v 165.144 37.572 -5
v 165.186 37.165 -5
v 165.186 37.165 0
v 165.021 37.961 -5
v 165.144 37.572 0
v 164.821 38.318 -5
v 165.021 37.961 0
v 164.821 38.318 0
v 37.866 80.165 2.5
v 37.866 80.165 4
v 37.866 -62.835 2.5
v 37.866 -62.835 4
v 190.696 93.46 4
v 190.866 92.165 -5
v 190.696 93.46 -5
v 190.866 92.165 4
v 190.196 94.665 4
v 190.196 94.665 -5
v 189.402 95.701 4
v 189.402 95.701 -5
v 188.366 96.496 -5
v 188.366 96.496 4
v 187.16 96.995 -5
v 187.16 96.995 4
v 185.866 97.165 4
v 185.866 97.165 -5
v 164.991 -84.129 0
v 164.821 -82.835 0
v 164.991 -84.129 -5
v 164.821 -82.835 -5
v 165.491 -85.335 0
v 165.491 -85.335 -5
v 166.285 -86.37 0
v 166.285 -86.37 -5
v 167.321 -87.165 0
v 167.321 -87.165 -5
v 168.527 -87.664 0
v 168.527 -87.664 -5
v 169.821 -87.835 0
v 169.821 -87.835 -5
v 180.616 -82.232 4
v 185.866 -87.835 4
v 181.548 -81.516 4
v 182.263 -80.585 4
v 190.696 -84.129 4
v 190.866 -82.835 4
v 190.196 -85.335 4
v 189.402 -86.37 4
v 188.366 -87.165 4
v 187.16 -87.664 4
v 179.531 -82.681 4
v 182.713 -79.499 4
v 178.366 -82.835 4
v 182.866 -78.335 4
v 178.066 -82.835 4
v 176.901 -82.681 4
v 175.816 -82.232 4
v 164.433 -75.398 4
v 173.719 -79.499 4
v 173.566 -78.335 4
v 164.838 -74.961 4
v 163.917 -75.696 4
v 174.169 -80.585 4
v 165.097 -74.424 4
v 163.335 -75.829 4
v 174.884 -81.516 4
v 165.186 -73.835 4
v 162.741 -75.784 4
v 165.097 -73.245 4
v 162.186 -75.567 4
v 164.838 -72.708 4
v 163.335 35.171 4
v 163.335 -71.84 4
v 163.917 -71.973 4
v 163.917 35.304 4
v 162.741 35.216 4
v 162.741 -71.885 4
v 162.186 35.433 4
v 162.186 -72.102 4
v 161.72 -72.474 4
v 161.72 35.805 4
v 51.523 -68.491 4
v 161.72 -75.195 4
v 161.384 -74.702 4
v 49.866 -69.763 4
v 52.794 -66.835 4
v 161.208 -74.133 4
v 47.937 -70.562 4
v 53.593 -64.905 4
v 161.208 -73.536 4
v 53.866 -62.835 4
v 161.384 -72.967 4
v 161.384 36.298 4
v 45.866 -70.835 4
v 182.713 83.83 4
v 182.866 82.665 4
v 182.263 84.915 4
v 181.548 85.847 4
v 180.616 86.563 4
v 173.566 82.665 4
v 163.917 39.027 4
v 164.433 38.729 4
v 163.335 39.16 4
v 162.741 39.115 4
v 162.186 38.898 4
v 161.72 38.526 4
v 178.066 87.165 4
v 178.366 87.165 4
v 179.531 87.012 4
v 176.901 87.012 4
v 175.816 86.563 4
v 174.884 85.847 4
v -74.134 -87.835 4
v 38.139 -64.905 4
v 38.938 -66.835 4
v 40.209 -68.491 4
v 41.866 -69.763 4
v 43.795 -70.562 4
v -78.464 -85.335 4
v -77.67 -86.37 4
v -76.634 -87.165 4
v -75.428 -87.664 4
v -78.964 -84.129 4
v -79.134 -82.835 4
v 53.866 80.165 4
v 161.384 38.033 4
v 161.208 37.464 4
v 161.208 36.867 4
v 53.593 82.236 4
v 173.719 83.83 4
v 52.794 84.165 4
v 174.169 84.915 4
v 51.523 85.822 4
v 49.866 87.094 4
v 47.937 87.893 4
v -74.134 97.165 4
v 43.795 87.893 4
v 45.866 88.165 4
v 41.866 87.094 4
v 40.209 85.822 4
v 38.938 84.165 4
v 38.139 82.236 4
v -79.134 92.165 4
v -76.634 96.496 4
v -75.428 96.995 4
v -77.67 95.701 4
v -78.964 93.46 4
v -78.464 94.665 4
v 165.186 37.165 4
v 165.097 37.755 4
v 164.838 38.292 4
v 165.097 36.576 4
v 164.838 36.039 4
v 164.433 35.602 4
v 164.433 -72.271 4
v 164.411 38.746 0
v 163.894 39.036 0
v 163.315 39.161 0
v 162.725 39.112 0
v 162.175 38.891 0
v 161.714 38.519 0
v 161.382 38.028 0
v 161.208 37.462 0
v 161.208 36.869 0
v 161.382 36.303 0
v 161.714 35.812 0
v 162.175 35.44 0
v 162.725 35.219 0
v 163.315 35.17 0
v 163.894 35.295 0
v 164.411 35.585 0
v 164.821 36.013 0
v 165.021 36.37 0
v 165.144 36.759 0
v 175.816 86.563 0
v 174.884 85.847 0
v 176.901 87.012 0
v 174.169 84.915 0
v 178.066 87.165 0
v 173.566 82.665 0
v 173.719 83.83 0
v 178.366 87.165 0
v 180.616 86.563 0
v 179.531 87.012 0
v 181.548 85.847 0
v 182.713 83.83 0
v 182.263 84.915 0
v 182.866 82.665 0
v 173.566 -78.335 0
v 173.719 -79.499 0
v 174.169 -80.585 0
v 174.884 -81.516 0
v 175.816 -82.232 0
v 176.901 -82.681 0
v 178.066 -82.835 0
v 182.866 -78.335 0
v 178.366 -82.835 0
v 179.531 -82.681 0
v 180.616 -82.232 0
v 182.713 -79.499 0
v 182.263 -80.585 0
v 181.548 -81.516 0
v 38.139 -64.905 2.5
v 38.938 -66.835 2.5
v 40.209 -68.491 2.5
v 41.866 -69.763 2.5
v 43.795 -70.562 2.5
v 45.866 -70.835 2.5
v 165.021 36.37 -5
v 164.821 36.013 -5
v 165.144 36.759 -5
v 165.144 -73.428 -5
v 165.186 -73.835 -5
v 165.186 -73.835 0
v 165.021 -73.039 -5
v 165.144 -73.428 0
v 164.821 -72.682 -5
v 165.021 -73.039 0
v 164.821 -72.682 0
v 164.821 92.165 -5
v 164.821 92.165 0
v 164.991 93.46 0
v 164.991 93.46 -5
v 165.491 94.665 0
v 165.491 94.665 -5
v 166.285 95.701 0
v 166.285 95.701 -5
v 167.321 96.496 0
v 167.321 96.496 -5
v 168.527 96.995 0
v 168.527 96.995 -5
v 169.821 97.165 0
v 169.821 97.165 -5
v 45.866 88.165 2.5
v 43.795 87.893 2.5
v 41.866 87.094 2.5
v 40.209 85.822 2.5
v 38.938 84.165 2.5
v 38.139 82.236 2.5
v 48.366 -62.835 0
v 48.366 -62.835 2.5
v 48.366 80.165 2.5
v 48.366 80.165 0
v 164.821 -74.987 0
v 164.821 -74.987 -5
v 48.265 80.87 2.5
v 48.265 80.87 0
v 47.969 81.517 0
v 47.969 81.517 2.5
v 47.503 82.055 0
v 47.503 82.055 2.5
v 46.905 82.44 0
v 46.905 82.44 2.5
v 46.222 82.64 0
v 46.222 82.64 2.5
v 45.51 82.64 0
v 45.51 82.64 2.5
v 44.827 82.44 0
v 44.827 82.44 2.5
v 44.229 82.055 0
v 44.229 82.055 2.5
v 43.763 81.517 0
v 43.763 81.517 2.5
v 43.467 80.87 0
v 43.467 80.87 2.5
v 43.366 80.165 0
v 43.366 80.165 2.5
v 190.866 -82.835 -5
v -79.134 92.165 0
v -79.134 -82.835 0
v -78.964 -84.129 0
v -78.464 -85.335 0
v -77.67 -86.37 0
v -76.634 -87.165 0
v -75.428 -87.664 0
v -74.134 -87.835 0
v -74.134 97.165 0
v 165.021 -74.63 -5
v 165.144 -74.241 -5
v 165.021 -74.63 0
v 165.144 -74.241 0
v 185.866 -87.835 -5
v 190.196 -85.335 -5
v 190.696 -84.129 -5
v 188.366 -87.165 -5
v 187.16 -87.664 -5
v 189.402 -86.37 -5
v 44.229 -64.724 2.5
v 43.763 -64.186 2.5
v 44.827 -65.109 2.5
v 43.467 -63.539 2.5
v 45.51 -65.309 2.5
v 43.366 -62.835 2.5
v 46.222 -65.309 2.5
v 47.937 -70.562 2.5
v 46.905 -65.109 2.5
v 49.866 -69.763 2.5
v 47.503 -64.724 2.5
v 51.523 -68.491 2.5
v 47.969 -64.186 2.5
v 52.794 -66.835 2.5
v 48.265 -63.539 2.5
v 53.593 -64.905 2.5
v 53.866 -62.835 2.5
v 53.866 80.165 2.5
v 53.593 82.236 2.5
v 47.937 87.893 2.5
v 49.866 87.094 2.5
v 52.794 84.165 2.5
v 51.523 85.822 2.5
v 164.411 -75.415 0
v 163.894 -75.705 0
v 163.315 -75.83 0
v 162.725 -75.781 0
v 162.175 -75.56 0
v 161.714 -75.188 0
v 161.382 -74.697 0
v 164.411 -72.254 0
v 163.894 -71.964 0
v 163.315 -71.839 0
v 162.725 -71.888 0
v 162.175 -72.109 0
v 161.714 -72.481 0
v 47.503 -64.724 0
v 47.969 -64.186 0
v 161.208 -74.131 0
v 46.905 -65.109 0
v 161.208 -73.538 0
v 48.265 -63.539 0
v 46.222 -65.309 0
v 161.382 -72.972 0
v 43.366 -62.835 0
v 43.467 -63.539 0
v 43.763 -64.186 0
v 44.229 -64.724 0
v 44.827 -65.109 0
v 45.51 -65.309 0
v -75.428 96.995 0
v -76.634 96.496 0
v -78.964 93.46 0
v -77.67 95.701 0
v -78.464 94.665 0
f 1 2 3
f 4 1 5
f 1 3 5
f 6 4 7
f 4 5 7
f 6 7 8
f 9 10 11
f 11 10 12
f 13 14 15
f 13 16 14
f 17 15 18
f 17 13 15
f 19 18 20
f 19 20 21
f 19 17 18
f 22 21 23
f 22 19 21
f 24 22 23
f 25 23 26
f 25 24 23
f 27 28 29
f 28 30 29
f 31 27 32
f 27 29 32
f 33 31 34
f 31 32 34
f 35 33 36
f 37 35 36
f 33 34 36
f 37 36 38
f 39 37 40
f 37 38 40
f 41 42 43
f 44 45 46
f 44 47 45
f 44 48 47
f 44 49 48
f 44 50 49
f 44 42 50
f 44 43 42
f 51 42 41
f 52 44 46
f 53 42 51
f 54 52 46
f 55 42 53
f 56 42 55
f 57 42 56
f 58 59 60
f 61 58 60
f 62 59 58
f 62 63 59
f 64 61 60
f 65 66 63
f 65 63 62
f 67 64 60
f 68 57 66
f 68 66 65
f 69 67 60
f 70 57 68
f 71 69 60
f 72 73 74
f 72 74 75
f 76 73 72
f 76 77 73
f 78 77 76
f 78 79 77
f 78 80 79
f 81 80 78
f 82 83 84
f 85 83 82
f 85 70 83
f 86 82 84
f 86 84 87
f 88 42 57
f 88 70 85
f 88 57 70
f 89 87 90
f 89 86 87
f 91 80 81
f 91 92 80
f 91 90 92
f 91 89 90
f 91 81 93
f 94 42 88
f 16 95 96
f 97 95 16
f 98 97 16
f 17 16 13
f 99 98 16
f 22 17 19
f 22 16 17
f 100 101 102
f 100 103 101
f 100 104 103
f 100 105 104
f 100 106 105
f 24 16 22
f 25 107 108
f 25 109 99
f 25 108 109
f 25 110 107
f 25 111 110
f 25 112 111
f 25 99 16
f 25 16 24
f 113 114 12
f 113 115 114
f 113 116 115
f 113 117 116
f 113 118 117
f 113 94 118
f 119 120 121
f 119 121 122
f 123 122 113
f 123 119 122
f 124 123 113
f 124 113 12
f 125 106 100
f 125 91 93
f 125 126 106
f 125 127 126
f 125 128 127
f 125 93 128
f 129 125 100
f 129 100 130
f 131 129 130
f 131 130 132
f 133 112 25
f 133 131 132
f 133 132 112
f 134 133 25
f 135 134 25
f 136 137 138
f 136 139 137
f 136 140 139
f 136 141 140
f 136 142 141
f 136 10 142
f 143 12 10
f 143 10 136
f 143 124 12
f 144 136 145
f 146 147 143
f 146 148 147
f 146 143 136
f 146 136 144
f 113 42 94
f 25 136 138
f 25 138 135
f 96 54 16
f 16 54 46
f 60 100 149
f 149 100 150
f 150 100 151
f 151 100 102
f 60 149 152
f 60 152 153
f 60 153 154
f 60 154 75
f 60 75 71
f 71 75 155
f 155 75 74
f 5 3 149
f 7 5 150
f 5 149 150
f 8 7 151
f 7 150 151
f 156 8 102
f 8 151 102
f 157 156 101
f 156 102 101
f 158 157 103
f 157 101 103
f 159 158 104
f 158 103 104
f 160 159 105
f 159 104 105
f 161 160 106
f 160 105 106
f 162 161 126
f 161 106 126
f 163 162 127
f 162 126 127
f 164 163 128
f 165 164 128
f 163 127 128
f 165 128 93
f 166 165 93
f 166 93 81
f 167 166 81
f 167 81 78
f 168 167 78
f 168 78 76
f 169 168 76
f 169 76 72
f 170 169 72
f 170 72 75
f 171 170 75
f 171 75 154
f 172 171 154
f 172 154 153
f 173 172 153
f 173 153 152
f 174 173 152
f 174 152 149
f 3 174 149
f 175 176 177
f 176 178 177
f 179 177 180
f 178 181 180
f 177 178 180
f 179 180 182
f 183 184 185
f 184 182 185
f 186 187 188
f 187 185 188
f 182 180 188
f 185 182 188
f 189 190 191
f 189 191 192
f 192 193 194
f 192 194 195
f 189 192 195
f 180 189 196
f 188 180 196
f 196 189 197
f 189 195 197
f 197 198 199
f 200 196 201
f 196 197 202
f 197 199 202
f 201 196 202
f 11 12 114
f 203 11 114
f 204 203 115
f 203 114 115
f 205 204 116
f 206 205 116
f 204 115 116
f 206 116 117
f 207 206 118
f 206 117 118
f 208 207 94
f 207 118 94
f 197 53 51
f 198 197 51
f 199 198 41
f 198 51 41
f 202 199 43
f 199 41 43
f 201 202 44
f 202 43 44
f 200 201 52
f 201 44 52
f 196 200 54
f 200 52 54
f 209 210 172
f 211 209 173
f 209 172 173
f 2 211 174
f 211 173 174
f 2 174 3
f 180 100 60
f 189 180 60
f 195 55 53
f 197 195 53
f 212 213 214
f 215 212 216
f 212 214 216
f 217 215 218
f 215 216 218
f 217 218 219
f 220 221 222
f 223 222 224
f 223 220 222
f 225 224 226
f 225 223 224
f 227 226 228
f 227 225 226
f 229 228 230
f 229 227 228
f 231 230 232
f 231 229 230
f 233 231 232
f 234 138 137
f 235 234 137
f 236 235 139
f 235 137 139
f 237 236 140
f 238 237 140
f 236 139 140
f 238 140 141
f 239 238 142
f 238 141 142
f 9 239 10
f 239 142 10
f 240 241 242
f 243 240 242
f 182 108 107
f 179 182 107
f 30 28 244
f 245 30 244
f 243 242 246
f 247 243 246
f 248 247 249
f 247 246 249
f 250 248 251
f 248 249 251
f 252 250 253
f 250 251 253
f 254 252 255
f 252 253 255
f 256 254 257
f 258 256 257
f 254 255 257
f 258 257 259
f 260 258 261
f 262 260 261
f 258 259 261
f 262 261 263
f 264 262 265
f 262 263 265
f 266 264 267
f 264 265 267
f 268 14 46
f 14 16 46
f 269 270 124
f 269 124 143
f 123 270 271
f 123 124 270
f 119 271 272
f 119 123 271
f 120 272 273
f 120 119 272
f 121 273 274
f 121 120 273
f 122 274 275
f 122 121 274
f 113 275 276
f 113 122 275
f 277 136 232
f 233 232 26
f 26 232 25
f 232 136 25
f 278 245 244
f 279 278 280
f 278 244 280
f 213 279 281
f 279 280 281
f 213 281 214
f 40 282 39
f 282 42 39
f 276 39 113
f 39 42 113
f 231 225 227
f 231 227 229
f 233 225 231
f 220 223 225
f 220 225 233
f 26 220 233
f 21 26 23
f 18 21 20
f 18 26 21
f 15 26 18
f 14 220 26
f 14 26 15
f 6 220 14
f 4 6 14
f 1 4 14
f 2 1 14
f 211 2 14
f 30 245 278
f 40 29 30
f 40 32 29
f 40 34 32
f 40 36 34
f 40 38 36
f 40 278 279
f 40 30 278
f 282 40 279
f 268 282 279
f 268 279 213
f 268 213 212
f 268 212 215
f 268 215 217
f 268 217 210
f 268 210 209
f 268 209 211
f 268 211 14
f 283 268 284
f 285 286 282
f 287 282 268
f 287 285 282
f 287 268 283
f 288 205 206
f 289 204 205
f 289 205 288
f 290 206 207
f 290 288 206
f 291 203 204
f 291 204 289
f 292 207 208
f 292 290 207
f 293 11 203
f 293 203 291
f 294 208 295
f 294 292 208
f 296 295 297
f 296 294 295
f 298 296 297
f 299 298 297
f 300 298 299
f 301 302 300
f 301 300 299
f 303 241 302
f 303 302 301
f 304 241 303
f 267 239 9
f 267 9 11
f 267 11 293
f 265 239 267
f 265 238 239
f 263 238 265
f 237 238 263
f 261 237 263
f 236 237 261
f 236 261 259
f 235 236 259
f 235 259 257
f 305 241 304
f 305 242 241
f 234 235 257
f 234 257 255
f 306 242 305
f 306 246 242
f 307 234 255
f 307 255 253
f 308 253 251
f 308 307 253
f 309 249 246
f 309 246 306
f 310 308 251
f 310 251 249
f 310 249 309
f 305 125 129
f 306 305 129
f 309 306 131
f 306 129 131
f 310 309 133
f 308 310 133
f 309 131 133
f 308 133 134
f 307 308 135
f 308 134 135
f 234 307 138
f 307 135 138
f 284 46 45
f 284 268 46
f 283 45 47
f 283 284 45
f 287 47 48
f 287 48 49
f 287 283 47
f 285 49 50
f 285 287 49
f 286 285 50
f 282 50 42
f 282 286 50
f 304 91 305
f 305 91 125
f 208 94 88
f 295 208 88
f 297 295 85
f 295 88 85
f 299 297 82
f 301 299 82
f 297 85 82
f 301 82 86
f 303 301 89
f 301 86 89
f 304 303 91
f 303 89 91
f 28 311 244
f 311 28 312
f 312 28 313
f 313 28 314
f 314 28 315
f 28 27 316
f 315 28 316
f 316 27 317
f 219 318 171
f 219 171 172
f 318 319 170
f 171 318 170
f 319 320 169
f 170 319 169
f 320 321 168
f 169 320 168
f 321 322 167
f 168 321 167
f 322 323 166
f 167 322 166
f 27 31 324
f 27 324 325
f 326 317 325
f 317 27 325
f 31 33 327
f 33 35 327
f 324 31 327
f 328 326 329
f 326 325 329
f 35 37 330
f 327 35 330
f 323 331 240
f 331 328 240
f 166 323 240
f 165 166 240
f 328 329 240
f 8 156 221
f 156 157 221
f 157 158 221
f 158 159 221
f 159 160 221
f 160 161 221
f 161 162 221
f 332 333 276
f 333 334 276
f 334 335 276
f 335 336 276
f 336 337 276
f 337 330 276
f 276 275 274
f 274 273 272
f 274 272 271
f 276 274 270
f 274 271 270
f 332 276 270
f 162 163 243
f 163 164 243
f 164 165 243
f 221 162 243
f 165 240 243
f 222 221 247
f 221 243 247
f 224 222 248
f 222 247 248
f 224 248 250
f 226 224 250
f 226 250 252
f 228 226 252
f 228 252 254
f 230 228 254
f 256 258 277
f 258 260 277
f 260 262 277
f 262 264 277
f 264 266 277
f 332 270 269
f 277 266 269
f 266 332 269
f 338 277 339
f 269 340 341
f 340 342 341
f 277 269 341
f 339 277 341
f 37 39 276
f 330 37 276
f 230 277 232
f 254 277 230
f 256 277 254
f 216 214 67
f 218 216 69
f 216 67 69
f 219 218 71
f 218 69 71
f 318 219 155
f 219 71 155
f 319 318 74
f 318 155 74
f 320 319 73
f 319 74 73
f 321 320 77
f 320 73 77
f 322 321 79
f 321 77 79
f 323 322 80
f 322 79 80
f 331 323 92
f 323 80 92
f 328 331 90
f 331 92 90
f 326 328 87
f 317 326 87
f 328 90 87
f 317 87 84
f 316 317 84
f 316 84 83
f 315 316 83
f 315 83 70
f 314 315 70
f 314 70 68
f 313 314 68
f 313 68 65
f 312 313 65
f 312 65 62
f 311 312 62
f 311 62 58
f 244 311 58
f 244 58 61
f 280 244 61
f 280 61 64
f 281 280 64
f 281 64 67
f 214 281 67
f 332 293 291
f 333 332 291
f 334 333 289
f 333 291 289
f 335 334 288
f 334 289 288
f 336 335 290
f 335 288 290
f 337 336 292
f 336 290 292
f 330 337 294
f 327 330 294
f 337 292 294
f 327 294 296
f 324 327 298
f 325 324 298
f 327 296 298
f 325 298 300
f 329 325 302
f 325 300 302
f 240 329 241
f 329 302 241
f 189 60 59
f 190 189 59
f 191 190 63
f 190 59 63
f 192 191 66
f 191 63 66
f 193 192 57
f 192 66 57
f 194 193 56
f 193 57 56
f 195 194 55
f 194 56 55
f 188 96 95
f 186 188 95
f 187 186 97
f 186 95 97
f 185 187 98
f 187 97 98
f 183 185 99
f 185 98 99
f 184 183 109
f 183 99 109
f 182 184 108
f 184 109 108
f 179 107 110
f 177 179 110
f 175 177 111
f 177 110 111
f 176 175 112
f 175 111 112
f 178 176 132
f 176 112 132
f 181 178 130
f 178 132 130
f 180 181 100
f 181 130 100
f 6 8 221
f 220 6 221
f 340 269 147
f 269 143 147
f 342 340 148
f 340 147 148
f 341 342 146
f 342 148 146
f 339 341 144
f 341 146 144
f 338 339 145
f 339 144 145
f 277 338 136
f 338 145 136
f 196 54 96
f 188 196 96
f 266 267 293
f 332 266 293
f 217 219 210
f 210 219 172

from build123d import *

# Parameters (mm, degrees)
F0_W      = 250
F0_H      = 185
F1_DEPTH  = 4
F3_DEPTH  = 1.5
F5_DEPTH  = 5
F6_R      = 2
F7_DEPTH  = 25
F8_DEPTH  = 20
F10_DEPTH = 4.001
F12_DEPTH = 5
F13_R     = 5


with BuildPart() as f1:
    # F0 (on Top) → F1 (new body)
    with BuildSketch(Plane.XY):
        with Locations((45.8660066128, 4.6654982038)):
            Rectangle(F0_W, F0_H)
    extrude(amount=F1_DEPTH)

    # F2 (on face) → F3 (cut)
    with BuildSketch(Plane.XY.offset(4)):
        with BuildLine():
            ThreePointArc((53.8660066128, 80.1654982038), (51.5228608623, 85.8223524533), (45.8660066128, 88.1654982038))
            ThreePointArc((45.8660066128, 88.1654982038), (40.2091523633, 85.8223524533), (37.8660066128, 80.1654982038))
            Line((37.8660066128, 80.1654982038), (37.8660066128, -62.8345017962))
            ThreePointArc((37.8660066128, -62.8345017962), (40.2091523633, -68.4913560457), (45.8660066128, -70.8345017962))
            ThreePointArc((45.8660066128, -70.8345017962), (51.5228608623, -68.4913560457), (53.8660066128, -62.8345017962))
            Line((53.8660066128, -62.8345017962), (53.8660066128, 80.1654982038))
        make_face()
    extrude(amount=-F3_DEPTH, mode=Mode.SUBTRACT)

    # F4 (on face) → F5 (cut)
    with BuildSketch(Plane.XY.offset(2.5)):
        with BuildLine():
            Line((48.3660066128, -62.8345017962), (48.3660066128, 80.1654982038))
            ThreePointArc((48.3660066128, 80.1654982038), (45.8660066128, 82.6654982038), (43.3660066128, 80.1654982038))
            Line((43.3660066128, 80.1654982038), (43.3660066128, -62.8345017962))
            ThreePointArc((43.3660066128, -62.8345017962), (45.8660066128, -65.3345017962), (48.3660066128, -62.8345017962))
        make_face()
    extrude(amount=-F5_DEPTH, mode=Mode.SUBTRACT)

    # F6 (on face) → F7 (cut)
    with BuildSketch(Plane.XY.offset(4)):
        with Locations((163.1860066128, 37.1654982038)):
            Circle(F6_R)
        with Locations((163.1860066128, -73.8345017962)):
            Circle(F6_R)
    extrude(amount=-F7_DEPTH, mode=Mode.SUBTRACT)

    # F8 (add): a face of the model
    f8_faces = [f1.faces().sort_by_distance(p)[0] for p in [
        (170.8660066128, 4.6654982038, 2),
    ]]
    extrude(f8_faces, amount=F8_DEPTH)

    # F9 (on face) → F10 (cut, through all)
    with BuildSketch(Plane.XY.offset(4)):
        with BuildLine():
            Line((178.3660066128, 87.1654982038), (178.0660066128, 87.1654982038))
            ThreePointArc((178.0660066128, 87.1654982038), (174.8840260974, 85.8474787192), (173.5660066128, 82.6654982038))
            Line((173.5660066128, 82.6654982038), (173.5660066128, -78.3345017962))
            ThreePointArc((173.5660066128, -78.3345017962), (174.8840260974, -81.5164823115), (178.0660066128, -82.8345017962))
            Line((178.0660066128, -82.8345017962), (178.3660066128, -82.8345017962))
            ThreePointArc((178.3660066128, -82.8345017962), (181.5479871281, -81.5164823115), (182.8660066128, -78.3345017962))
            Line((182.8660066128, -78.3345017962), (182.8660066128, 82.6654982038))
            ThreePointArc((182.8660066128, 82.6654982038), (181.5479871281, 85.8474787192), (178.3660066128, 87.1654982038))
        make_face()
    extrude(amount=-F10_DEPTH, mode=Mode.SUBTRACT)

    # F11 (on face) → F12 (join)
    with BuildSketch(Plane(origin=(0, 0, 0), x_dir=(1, 0, 0), z_dir=(0, 0, -1))):
        with BuildLine():
            Line((190.8660066128, -97.1654982038), (190.8660066128, 87.8345017962))
            Line((190.8660066128, 87.8345017962), (164.8207604885, 87.8345017962))
            Line((164.8207604885, 87.8345017962), (164.8207604885, 74.9867082732))
            ThreePointArc((164.8207604885, 74.9867082732), (165.0925096617, 74.4388577544), (165.1860066128, 73.8345017962))
            ThreePointArc((165.1860066128, 73.8345017962), (165.0925096617, 73.2301458379), (164.8207604885, 72.6822953191))
            Line((164.8207604885, 72.6822953191), (164.8207604885, -36.0132917268))
            ThreePointArc((164.8207604885, -36.0132917268), (165.0925096617, -36.5611422456), (165.1860066128, -37.1654982038))
            ThreePointArc((165.1860066128, -37.1654982038), (165.0925096617, -37.7698541621), (164.8207604885, -38.3177046809))
            Line((164.8207604885, -38.3177046809), (164.8207604885, -97.1654982038))
            Line((164.8207604885, -97.1654982038), (190.8660066128, -97.1654982038))
        make_face()
        with BuildLine():
            ThreePointArc((182.8660066128, -82.6654982038), (181.5479871281, -85.8474787192), (178.3660066128, -87.1654982038))
            Line((178.3660066128, -87.1654982038), (178.0660066128, -87.1654982038))
            ThreePointArc((178.0660066128, -87.1654982038), (174.8840260974, -85.8474787192), (173.5660066128, -82.6654982038))
            Line((173.5660066128, -82.6654982038), (173.5660066128, 78.3345017962))
            ThreePointArc((173.5660066128, 78.3345017962), (174.8840260974, 81.5164823115), (178.0660066128, 82.8345017962))
            Line((178.0660066128, 82.8345017962), (178.3660066128, 82.8345017962))
            ThreePointArc((178.3660066128, 82.8345017962), (181.5479871281, 81.5164823115), (182.8660066128, 78.3345017962))
            Line((182.8660066128, 78.3345017962), (182.8660066128, -82.6654982038))
        make_face(mode=Mode.SUBTRACT)
        with BuildLine():
            Line((178.0660066128, -87.1654982038), (178.3660066128, -87.1654982038))
            ThreePointArc((178.3660066128, -87.1654982038), (181.5479871281, -85.8474787192), (182.8660066128, -82.6654982038))
            Line((182.8660066128, -82.6654982038), (182.8660066128, 78.3345017962))
            ThreePointArc((182.8660066128, 78.3345017962), (181.5479871281, 81.5164823115), (178.3660066128, 82.8345017962))
            Line((178.3660066128, 82.8345017962), (178.0660066128, 82.8345017962))
            ThreePointArc((178.0660066128, 82.8345017962), (174.8840260974, 81.5164823115), (173.5660066128, 78.3345017962))
            Line((173.5660066128, 78.3345017962), (173.5660066128, -82.6654982038))
            ThreePointArc((173.5660066128, -82.6654982038), (174.8840260974, -85.8474787192), (178.0660066128, -87.1654982038))
        make_face()
    extrude(amount=F12_DEPTH)

    # F13
    f13_edges = [f1.edges().sort_by_distance(p)[0] for p in [
        (190.866007, 97.165498, -0.5),
        (-79.133993, 97.165498, 2),
        (-79.133993, -87.834502, 2),
        (190.866007, -87.834502, -0.5),
        (164.82076, -87.834502, -2.5),
        (164.82076, 97.165498, -2.5),
    ]]
    fillet(f13_edges, radius=F13_R)


solid = f1.part
